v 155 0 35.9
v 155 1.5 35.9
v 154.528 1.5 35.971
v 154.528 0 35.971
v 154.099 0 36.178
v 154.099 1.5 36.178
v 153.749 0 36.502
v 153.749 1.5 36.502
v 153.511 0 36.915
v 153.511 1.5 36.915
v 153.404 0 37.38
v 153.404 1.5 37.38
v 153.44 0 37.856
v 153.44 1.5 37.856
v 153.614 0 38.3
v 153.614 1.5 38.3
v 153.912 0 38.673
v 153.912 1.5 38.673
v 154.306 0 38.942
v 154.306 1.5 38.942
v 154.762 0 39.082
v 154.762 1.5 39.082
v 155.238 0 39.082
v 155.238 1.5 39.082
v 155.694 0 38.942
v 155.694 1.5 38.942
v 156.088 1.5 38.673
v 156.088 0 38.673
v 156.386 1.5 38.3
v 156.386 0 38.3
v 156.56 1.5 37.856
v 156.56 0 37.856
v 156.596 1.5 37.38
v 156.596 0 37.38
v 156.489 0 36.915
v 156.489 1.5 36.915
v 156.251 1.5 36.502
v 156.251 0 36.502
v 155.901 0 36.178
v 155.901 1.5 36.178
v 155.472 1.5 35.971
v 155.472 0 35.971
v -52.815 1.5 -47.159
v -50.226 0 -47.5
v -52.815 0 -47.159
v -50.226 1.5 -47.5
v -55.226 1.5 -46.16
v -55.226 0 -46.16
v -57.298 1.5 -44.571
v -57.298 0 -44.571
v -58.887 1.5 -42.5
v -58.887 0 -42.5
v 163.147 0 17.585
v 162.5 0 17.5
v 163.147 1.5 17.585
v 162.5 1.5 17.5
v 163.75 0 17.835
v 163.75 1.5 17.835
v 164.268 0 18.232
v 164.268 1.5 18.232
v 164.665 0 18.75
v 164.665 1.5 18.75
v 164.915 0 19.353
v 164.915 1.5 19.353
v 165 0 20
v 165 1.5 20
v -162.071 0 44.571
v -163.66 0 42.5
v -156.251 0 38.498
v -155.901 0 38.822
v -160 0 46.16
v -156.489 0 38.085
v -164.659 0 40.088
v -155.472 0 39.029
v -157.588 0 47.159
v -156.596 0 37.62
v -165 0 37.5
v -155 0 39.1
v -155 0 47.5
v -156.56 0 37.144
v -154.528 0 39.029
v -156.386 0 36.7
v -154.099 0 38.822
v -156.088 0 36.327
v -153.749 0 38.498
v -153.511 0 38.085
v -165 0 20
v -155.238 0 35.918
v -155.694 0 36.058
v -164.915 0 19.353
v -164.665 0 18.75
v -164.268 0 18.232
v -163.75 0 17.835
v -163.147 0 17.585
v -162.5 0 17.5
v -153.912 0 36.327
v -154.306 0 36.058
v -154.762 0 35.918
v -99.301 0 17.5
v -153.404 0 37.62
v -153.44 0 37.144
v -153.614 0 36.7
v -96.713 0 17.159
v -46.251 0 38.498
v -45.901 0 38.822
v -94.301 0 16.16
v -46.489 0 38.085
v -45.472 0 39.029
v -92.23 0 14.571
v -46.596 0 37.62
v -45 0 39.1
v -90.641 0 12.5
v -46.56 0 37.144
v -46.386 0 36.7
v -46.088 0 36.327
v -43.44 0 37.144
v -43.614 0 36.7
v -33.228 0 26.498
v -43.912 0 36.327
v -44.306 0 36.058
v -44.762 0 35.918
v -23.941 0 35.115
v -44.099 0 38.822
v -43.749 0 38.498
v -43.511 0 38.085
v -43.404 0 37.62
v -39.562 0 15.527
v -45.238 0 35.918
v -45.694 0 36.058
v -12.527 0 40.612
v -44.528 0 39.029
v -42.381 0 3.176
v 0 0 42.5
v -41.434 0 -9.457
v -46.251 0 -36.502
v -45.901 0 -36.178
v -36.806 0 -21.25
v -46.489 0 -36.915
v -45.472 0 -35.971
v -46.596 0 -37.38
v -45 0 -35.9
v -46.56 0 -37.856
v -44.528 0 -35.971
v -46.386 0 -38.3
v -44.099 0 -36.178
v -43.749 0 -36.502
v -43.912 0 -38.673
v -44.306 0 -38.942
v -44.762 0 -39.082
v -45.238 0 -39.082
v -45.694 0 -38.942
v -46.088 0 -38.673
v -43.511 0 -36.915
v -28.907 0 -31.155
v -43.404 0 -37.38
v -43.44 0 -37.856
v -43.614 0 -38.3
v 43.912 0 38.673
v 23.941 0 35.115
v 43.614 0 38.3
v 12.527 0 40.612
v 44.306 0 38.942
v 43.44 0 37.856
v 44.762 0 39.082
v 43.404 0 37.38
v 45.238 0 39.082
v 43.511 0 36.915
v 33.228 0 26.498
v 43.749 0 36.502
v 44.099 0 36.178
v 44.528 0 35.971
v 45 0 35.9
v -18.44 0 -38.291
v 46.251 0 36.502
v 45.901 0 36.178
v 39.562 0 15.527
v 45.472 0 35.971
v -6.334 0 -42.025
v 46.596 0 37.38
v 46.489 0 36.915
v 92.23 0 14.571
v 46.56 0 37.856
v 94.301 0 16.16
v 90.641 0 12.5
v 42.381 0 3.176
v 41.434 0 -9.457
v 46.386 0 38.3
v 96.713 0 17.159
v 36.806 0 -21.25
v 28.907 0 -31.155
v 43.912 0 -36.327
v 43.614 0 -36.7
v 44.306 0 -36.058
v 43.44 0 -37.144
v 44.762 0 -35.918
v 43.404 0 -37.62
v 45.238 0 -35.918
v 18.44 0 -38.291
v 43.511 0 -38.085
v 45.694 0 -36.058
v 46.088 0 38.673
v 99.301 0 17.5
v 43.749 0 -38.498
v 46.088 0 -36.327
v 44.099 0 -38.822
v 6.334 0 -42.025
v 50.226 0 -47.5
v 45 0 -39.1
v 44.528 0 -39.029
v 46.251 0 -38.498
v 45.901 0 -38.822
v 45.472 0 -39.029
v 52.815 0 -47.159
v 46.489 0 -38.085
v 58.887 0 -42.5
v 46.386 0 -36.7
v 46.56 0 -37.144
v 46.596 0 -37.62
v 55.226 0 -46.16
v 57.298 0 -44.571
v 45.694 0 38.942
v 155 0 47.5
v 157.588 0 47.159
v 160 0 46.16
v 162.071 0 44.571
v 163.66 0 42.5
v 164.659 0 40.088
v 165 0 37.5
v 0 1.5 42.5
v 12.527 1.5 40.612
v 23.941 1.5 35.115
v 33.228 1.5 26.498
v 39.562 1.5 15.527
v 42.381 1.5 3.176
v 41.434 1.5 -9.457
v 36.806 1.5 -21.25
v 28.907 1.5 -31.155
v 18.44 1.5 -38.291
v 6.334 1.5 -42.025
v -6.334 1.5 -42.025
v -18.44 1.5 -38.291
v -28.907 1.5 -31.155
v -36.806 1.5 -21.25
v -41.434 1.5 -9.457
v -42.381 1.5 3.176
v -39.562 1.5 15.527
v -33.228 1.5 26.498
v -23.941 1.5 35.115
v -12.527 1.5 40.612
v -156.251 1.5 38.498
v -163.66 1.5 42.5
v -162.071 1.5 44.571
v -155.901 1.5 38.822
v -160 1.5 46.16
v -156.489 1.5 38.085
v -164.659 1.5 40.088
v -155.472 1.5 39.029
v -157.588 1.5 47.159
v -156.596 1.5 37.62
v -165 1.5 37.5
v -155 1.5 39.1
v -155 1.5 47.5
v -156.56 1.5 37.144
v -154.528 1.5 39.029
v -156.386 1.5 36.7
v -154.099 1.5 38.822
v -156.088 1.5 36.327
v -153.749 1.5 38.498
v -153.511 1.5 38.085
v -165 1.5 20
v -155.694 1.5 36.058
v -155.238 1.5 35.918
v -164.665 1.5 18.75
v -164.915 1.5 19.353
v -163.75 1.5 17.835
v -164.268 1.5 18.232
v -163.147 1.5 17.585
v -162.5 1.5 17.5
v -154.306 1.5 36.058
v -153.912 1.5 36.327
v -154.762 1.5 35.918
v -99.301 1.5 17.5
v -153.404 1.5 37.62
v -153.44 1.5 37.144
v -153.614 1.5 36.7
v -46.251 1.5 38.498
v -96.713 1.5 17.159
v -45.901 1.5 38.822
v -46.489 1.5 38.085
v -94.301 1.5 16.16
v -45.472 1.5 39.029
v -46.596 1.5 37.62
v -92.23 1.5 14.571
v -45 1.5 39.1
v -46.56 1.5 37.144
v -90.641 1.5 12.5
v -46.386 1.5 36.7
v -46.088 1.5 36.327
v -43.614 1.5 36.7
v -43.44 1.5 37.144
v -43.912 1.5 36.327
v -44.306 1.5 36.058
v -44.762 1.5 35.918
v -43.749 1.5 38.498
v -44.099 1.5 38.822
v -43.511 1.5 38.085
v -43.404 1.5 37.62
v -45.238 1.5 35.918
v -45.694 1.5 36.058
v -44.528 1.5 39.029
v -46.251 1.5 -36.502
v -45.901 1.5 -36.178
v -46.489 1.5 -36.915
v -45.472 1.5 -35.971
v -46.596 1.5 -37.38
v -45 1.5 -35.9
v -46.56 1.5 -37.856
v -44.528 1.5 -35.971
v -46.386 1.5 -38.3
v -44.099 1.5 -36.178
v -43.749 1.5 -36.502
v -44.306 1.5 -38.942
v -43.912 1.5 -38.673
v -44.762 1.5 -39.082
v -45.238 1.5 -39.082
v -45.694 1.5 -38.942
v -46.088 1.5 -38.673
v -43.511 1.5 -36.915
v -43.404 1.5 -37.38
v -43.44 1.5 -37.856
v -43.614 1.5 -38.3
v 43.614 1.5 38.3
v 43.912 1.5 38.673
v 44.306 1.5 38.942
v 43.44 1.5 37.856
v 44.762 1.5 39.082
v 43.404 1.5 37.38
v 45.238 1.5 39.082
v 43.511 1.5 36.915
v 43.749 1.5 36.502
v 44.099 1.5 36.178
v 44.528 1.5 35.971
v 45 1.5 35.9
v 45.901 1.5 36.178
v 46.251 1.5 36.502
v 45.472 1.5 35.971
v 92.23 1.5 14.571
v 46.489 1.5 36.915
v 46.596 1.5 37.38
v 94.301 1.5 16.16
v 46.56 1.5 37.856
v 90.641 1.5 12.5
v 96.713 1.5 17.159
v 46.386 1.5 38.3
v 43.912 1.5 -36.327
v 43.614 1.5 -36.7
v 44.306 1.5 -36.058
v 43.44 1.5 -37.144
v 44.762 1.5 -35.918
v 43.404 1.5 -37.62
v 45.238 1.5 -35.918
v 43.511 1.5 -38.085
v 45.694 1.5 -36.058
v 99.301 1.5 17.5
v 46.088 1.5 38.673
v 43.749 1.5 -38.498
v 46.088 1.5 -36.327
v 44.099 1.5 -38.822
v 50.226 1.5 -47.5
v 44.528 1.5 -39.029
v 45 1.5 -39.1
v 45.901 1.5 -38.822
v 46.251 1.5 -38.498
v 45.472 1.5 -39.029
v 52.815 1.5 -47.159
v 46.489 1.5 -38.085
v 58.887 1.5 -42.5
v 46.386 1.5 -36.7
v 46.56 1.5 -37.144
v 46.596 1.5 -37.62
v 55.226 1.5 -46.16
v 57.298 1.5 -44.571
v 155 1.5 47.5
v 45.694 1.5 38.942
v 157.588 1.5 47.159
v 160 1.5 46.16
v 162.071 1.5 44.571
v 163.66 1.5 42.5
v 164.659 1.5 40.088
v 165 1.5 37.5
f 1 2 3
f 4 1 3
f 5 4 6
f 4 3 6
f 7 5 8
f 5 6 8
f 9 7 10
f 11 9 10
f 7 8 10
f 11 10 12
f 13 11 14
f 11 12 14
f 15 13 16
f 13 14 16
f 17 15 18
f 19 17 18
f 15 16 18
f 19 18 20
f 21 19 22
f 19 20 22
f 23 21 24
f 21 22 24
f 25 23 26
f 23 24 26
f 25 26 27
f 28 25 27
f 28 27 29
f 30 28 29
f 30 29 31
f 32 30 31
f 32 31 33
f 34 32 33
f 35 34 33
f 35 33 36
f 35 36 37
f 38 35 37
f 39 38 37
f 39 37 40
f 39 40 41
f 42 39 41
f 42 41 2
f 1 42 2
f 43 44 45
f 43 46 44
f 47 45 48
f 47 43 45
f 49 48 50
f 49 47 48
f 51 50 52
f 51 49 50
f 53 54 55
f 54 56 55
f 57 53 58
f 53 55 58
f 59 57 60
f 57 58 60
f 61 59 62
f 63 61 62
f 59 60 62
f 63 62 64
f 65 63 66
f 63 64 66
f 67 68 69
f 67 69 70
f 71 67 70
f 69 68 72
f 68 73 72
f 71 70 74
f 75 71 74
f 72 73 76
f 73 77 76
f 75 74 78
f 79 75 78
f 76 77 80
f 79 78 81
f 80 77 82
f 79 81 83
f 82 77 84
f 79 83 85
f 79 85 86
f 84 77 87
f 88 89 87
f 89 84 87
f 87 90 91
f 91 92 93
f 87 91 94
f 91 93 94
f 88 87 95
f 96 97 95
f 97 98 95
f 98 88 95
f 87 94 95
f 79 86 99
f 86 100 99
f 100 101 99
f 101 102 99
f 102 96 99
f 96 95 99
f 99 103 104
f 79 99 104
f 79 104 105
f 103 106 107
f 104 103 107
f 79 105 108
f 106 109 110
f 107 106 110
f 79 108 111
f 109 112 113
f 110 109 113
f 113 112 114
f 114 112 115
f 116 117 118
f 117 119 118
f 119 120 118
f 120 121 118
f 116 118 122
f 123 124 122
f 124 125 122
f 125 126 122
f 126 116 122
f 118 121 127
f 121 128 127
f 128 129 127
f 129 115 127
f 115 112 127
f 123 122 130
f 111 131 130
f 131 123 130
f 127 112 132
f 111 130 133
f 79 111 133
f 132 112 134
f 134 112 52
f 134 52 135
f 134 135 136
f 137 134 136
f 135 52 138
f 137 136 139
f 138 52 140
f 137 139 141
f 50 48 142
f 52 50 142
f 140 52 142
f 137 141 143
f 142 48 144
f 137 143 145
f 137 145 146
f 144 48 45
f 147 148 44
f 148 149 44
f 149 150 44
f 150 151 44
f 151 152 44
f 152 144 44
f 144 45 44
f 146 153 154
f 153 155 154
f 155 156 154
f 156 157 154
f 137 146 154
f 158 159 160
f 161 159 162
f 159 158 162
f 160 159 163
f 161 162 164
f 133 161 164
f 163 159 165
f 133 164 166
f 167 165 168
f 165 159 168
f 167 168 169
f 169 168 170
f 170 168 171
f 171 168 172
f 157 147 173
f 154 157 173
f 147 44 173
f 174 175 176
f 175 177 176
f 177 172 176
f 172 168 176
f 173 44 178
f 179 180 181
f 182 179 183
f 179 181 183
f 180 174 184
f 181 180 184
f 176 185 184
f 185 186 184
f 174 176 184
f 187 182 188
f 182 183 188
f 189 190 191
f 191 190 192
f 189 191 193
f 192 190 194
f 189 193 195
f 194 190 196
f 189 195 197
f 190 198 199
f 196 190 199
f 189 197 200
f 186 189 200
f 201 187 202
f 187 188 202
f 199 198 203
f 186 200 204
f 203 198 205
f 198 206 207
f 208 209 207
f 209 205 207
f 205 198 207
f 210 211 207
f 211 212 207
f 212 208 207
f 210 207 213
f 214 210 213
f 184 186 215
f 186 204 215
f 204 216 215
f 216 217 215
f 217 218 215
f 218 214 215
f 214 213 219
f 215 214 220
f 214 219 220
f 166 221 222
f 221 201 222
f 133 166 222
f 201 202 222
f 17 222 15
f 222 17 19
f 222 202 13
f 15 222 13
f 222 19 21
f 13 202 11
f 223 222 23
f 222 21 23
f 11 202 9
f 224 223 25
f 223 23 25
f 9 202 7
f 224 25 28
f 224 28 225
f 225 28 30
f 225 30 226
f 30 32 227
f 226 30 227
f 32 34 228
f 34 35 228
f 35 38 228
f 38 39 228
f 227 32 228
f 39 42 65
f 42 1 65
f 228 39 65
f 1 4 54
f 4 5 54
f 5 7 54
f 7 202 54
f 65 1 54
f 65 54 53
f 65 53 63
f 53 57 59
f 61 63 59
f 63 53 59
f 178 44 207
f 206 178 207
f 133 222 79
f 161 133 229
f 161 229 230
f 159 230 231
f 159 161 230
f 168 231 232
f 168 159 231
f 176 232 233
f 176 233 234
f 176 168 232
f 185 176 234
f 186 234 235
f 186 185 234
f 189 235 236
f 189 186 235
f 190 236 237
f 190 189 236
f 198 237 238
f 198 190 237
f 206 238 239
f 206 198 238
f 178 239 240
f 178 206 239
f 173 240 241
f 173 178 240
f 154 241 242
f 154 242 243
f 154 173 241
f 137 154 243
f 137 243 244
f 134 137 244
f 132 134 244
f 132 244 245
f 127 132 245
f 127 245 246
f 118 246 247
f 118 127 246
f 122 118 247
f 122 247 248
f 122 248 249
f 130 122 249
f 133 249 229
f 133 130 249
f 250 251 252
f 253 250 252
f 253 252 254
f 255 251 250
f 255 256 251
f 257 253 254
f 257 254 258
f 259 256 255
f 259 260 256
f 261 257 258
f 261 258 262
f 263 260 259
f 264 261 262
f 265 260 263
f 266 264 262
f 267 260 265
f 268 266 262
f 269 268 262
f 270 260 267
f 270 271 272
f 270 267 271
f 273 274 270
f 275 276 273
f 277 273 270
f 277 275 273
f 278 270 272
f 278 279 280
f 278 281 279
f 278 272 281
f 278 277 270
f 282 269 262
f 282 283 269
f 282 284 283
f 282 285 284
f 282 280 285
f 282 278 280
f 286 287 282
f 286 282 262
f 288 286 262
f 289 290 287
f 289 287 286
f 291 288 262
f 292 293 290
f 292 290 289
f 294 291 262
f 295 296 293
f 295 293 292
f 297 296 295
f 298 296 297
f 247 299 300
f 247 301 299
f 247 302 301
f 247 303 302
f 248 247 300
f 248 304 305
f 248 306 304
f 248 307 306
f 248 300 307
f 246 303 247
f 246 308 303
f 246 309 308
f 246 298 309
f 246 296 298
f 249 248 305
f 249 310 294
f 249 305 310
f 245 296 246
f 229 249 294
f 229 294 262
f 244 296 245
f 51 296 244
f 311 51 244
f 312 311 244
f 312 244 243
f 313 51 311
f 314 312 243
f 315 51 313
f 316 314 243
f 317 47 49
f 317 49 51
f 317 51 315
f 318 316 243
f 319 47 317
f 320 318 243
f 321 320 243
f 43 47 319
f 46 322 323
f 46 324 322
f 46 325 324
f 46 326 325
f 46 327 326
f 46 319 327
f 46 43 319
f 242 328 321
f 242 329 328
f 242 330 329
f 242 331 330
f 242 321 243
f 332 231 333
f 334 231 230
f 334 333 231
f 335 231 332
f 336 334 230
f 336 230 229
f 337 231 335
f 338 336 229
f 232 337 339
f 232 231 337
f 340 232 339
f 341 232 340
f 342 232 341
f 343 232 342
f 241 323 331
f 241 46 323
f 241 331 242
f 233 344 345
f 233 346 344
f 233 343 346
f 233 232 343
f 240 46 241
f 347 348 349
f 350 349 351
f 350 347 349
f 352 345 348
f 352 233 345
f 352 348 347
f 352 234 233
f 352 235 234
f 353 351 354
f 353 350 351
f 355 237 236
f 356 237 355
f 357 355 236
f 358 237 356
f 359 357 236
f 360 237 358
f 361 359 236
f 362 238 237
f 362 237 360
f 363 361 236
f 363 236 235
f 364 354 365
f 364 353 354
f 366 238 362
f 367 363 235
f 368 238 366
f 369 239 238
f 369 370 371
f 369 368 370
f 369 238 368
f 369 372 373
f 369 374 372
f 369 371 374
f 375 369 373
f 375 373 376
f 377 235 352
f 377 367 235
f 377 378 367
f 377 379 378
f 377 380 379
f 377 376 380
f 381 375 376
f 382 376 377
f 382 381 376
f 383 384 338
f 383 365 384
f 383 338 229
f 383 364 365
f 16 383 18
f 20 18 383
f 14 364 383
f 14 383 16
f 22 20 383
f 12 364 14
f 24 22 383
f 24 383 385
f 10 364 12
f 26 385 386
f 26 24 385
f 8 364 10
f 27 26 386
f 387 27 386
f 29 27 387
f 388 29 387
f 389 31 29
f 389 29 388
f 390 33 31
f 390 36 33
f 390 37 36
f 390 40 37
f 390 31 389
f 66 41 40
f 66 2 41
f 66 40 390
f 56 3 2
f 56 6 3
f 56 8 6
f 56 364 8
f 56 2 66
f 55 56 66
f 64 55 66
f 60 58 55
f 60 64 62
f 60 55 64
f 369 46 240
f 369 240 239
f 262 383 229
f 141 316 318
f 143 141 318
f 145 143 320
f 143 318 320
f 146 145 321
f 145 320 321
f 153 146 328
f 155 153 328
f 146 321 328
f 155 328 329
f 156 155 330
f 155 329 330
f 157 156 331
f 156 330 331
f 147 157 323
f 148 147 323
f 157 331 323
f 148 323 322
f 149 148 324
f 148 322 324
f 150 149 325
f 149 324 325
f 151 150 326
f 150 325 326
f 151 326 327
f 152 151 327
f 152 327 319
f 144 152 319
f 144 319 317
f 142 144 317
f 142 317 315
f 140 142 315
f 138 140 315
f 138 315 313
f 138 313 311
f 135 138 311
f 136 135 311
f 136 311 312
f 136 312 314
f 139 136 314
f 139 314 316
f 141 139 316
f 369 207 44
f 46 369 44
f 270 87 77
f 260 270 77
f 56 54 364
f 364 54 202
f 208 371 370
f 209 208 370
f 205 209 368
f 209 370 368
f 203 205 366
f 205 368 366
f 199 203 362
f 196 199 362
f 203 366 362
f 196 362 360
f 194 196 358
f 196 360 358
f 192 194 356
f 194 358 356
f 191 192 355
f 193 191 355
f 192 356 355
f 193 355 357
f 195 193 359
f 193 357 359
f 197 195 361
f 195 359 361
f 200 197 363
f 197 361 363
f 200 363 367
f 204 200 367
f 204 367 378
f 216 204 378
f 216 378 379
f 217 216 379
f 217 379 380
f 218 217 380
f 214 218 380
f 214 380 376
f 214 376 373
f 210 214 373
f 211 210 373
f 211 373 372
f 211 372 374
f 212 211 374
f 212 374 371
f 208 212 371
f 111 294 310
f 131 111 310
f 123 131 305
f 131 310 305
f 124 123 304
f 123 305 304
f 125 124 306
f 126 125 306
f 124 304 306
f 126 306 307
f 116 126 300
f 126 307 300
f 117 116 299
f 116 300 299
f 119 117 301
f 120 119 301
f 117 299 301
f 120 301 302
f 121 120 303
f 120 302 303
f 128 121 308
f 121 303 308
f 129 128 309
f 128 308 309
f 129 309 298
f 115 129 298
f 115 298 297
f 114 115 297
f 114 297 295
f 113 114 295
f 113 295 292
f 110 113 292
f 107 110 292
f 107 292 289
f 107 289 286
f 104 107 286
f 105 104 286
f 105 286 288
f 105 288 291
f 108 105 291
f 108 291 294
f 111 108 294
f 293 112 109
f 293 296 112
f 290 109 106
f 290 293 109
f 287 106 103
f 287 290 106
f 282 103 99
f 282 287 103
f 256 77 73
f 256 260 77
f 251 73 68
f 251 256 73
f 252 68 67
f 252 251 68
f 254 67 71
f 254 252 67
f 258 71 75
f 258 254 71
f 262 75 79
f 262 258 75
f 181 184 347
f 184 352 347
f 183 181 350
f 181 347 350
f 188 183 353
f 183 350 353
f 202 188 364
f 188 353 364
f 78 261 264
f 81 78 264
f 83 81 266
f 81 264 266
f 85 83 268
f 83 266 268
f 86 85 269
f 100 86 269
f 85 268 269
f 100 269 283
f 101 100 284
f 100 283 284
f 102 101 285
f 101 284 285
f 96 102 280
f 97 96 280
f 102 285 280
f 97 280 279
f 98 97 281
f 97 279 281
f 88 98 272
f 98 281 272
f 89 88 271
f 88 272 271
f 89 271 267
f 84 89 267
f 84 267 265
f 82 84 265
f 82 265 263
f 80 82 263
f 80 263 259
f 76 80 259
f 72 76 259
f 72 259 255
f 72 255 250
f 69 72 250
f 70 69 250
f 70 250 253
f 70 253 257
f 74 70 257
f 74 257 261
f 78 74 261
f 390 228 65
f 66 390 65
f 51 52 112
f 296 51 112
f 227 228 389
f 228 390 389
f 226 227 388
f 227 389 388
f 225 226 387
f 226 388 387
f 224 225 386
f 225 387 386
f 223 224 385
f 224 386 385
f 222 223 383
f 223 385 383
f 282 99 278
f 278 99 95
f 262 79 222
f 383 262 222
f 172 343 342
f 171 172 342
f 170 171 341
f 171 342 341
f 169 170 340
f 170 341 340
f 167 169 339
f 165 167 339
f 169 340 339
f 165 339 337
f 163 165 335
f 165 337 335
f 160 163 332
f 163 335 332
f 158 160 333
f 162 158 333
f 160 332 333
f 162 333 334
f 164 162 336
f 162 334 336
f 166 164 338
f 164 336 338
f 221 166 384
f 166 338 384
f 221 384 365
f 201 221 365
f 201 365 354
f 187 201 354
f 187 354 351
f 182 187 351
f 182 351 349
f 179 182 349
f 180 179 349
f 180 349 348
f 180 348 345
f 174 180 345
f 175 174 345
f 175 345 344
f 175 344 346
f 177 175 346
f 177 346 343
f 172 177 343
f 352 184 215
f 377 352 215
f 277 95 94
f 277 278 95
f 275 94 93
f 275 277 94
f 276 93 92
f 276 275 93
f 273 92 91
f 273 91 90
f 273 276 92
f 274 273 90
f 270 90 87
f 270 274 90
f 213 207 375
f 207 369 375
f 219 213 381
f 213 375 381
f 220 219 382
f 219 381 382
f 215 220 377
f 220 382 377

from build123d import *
from OCP.BRepFilletAPI import BRepFilletAPI_MakeFillet

# Parameters (mm, degrees)
ESQUISSE1_R             = 42.5
BOSS_EXTRU_1_DEPTH      = 1.5
CONG_1_R1               = 10
CONG_1_R2               = 2.5
ESQUISSE2_R             = 1.6
ENL_V_MAT_EXTRU_1_DEPTH = 172.707600298


with BuildPart() as part:
    # Esquisse1 → Boss.-Extru.1 (new body)
    with BuildSketch(Plane(origin=(0, 0, 0), x_dir=(1, 0, 0), z_dir=(0, 1, 0))):
        Polygon((56, 47.5), (-56, 47.5), (-93.527767497, -17.5), (-165, -17.5), (-165, -47.5), (165, -47.5), (165, -17.5), (93.527767497, -17.5), align=None)
        Circle(ESQUISSE1_R, mode=Mode.SUBTRACT)
    extrude(amount=BOSS_EXTRU_1_DEPTH)

    # Congé1: one fillet with a radius per group of edges: ONE call of the kernel's fillet builder (fillet() takes one radius for all edges)
    cong_1_edges_1 = [part.edges().sort_by_distance(p)[0] for p in [
        (-165, 0.75, 47.5),
        (165, 0.75, 47.5),
        (-93.527767497, 0.75, 17.5),
        (-56, 0.75, -47.5),
        (56, 0.75, -47.5),
        (93.527767497, 0.75, 17.5),
    ]]
    cong_1_edges_2 = [part.edges().sort_by_distance(p)[0] for p in [
        (165, 0.75, 17.5),
        (-165, 0.75, 17.5),
    ]]
    cong_1 = BRepFilletAPI_MakeFillet(part.part.solid().wrapped)
    for e in cong_1_edges_1:
        cong_1.Add(CONG_1_R1, e.wrapped)
    for e in cong_1_edges_2:
        cong_1.Add(CONG_1_R2, e.wrapped)
    add(Compound.cast(cong_1.Shape()), mode=Mode.REPLACE)

    # Esquisse2 → Enlèv. mat.-Extru.1 (cut, through all)
    with BuildSketch(Plane(origin=(0, 1.5, 0), x_dir=(1, 0, 0), z_dir=(0, 1, 0))):
        with Locations((-155, -37.5)):
            Circle(ESQUISSE2_R)
        with Locations((-45, -37.5)):
            Circle(ESQUISSE2_R)
        with Locations((-45, 37.5)):
            Circle(ESQUISSE2_R)
        with Locations((45, -37.5)):
            Circle(ESQUISSE2_R)
        with Locations((45, 37.5)):
            Circle(ESQUISSE2_R)
        with Locations((155, -37.5)):
            Circle(ESQUISSE2_R)
    extrude(amount=-ENL_V_MAT_EXTRU_1_DEPTH, mode=Mode.SUBTRACT)


solid = part.part
